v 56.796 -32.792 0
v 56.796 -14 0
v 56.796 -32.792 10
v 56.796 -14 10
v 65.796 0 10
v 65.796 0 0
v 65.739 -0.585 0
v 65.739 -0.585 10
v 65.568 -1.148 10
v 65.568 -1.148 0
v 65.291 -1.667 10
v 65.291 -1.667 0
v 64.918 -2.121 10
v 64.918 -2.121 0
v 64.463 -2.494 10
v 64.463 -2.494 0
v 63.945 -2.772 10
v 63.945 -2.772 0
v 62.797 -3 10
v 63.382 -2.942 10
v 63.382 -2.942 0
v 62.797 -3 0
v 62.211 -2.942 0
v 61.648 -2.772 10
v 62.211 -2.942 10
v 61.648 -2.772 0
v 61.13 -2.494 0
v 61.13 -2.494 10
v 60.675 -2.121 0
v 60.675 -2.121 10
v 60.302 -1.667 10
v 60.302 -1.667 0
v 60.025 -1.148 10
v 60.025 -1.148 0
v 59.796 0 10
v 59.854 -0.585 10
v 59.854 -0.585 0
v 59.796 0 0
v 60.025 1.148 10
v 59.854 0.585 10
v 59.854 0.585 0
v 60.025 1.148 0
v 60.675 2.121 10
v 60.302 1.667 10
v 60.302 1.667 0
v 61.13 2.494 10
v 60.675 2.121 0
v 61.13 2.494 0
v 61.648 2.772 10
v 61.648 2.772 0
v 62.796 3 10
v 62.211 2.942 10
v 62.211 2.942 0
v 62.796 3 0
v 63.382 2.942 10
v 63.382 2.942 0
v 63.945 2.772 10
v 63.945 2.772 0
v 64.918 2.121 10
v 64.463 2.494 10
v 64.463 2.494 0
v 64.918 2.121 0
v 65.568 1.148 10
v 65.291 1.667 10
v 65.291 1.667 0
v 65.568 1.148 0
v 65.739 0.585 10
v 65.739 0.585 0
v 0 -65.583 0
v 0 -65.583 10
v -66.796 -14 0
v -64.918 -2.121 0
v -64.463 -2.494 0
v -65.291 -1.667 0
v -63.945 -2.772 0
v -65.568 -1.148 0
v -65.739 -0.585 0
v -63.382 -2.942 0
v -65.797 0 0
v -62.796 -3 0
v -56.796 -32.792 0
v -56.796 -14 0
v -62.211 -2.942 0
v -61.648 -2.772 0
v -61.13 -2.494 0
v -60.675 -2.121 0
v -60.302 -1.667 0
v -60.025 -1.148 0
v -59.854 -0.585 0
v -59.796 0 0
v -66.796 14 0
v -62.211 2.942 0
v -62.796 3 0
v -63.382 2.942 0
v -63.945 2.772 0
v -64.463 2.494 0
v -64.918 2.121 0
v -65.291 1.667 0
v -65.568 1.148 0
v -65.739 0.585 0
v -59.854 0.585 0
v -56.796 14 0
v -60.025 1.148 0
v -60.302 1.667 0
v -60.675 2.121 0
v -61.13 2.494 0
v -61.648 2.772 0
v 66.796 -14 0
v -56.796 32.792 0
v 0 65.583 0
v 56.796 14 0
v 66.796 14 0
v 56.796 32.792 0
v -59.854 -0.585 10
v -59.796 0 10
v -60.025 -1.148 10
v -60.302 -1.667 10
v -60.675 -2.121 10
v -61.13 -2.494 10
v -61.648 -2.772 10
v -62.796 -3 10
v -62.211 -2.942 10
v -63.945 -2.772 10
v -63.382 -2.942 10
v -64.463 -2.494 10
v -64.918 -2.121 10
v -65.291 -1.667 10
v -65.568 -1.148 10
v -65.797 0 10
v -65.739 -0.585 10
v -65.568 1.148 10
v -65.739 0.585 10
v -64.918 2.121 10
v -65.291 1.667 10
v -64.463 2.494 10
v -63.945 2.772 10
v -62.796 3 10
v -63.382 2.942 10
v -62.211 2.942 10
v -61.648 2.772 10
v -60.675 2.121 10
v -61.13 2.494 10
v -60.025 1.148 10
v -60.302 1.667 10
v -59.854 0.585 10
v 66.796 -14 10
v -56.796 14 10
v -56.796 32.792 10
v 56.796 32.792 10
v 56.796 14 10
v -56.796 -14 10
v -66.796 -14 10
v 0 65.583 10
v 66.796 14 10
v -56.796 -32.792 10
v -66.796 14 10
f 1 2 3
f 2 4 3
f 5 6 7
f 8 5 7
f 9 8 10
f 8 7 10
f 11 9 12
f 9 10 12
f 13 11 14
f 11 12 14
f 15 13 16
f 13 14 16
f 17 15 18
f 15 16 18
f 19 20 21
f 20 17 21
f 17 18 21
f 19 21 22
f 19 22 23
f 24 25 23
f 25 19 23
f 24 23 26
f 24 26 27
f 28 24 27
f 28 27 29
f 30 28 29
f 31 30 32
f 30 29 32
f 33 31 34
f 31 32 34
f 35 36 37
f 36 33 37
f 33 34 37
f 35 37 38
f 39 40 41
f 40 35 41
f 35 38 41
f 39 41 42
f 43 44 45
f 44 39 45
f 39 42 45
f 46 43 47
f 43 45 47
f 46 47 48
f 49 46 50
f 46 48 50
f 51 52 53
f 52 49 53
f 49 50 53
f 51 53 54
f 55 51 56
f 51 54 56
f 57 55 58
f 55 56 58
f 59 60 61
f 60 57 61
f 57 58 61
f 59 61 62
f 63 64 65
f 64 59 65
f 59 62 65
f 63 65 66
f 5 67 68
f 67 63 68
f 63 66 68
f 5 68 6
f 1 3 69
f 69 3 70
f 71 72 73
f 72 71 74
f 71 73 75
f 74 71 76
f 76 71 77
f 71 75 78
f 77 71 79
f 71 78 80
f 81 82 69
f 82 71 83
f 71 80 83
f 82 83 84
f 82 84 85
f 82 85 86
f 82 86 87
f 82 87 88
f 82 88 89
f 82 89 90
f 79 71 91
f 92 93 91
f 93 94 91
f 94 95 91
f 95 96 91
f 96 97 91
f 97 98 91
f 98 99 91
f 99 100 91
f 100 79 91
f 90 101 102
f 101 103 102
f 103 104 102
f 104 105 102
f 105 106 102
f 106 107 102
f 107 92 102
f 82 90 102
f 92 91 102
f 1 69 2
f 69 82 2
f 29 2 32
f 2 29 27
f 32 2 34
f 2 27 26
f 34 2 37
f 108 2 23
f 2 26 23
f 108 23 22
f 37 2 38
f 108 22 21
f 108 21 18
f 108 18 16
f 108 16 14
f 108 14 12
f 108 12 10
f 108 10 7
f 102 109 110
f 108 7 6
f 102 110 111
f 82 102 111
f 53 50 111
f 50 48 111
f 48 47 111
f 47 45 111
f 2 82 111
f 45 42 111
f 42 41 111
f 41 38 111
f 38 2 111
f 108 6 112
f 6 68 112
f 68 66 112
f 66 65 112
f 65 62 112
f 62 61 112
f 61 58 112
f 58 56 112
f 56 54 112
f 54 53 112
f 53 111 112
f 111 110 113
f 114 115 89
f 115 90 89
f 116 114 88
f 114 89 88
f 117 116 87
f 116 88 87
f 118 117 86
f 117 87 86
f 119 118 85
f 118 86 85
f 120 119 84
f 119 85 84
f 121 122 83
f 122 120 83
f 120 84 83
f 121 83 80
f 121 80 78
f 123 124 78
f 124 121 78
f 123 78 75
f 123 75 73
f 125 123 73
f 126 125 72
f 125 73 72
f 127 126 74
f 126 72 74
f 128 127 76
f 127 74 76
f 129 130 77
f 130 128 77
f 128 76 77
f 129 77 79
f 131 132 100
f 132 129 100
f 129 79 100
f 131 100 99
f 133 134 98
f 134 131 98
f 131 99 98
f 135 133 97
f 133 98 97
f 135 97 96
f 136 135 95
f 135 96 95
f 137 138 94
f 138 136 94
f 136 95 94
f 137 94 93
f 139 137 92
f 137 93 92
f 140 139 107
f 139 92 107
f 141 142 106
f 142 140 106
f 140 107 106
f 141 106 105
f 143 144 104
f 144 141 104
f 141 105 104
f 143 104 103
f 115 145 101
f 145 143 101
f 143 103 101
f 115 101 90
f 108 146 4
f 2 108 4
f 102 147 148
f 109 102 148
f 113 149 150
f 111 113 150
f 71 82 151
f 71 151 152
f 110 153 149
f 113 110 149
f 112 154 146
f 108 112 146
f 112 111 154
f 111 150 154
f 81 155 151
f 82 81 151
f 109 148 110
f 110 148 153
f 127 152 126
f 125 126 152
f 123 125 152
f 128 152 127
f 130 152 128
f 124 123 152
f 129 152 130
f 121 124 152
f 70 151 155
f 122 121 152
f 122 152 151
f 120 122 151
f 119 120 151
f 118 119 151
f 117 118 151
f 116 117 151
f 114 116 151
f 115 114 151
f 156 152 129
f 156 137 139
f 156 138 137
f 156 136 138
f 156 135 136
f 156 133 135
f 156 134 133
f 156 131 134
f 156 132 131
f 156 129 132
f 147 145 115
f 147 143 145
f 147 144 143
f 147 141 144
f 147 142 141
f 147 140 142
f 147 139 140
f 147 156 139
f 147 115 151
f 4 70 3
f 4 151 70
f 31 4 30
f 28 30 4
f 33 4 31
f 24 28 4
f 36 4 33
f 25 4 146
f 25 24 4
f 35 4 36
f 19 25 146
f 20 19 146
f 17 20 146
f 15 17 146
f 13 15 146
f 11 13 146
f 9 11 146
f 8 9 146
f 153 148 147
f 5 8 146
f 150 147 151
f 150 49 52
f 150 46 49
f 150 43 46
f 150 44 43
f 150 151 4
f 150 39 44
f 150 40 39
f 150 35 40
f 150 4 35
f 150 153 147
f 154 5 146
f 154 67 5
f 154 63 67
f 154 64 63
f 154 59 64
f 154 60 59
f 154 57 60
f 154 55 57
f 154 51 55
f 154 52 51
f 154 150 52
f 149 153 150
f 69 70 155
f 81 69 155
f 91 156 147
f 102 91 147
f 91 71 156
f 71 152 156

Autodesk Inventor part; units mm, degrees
ref_plane "YZ Plane" through (0, 0, 0) normal (1, 0, 0) x (0, 1, 0)
ref_plane "XZ Plane" through (0, 0, 0) normal (0, 1, 0) x (-1, 0, 0)
ref_plane "XY Plane" through (0, 0, 0) normal (0, 0, 1) x (1, 0, 0)
sketch "Sketch1" plane through (0, 0, 0) normal (0, 0, 1) x (1, 0, 0)
  line L0 (0, 66.7376) -> (57.7965, 33.3688)
  line L1 (57.7965, 33.3688) -> (57.7965, -33.3688)
  line L2 (57.7965, -33.3688) -> (0, -66.7376)
  line L3 (0, -66.7376) -> (-57.7965, -33.3688)
  line L4 (-57.7965, -33.3688) -> (-57.7965, 33.3688)
  line L5 (-57.7965, 33.3688) -> (0, 66.7376)
  line L6 (-57.7965, 15) -> (-67.7965, 15)
  line L7 (-67.7965, 15) -> (-67.7965, -15)
  line L8 (-67.7965, -15) -> (-57.7965, -15)
  line L9 (-57.7965, -15) -> (-57.7965, 15)
  line L10 (57.7965, 15) -> (67.7965, 15)
  line L11 (67.7965, 15) -> (67.7965, -15)
  line L12 (67.7965, -15) -> (57.7965, -15)
  line L13 (57.7965, -15) -> (57.7965, 15)
  circle A0 centre (-62.7965, 0) radius 3
  circle A1 centre (62.7965, 0) radius 3
  point P0 (0, 0)
  point P1 (0, 0)
  point P2 (-57.7965, 0)
  point P3 (57.7965, 0)
  point P4 (62.7965, 15)
  point P5 (-62.7965, 15)
  dimension "d0" = 10
  dimension "d1" = 30
  dimension "d2" = 30
  dimension "d3" = 10
  dimension "d4" = 133.4752
  dimension "d5" = 6
  dimension "d6" = 6
extrude "Extrusion1" add sketch "Sketch1" along normal blind 10
sketch "Sketch2" plane through (0, 0, 10) normal (0, 0, 1) x (1, 0, 0)
  circle A0 centre (62.7965, 0) radius 3 projected
  circle A1 centre (-62.7965, 0) radius 3 projected
  line L0 (-57.7965, 15) -> (-67.7965, 15) projected
  line L1 (-67.7965, 15) -> (-67.7965, -15) projected
  line L2 (-67.7965, -15) -> (-57.7965, -15) projected
  line L3 (-57.7965, -15) -> (-57.7965, -33.3688) projected
  line L4 (-57.7965, -33.3688) -> (0, -66.7376) projected
  line L5 (0, -66.7376) -> (57.7965, -33.3688) projected
  line L6 (57.7965, -33.3688) -> (57.7965, -15) projected
  line L7 (57.7965, -15) -> (67.7965, -15) projected
  line L8 (67.7965, -15) -> (67.7965, 15) projected
  line L9 (67.7965, 15) -> (57.7965, 15) projected
  line L10 (57.7965, 15) -> (57.7965, 33.3688) projected
  line L11 (57.7965, 33.3688) -> (0, 66.7376) projected
  line L12 (0, 66.7376) -> (-57.7965, 33.3688) projected
  line L13 (-57.7965, 33.3688) -> (-57.7965, 15) projected
  line L14 (-56.7965, 32.7915) -> (0, 65.5829)
  line L15 (0, 65.5829) -> (56.7965, 32.7915)
  line L16 (56.7965, 32.7915) -> (56.7965, 14)
  line L17 (56.7965, 14) -> (66.7965, 14)
  line L18 (66.7965, 14) -> (66.7965, -14)
  line L19 (66.7965, -14) -> (56.7965, -14)
  line L20 (56.7965, -14) -> (56.7965, -32.7915)
  line L21 (56.7965, -32.7915) -> (0, -65.5829)
  line L22 (0, -65.5829) -> (-56.7965, -32.7915)
  line L23 (-56.7965, -32.7915) -> (-56.7965, -14)
  line L24 (-56.7965, -14) -> (-66.7965, -14)
  line L25 (-66.7965, -14) -> (-66.7965, 14)
  line L26 (-66.7965, 14) -> (-56.7965, 14)
  line L27 (-56.7965, 14) -> (-56.7965, 32.7915)
  point P0 (0, 0)
  dimension "d9" = 1
extrude "Extrusion2" cut sketch "Sketch2" against normal through all contours L13 L12 L11 L10 L9 L8 L7 L6 L5 L4 L3 L2 L1 L0
properties part number "TARM16" material "ABS Plastic"
